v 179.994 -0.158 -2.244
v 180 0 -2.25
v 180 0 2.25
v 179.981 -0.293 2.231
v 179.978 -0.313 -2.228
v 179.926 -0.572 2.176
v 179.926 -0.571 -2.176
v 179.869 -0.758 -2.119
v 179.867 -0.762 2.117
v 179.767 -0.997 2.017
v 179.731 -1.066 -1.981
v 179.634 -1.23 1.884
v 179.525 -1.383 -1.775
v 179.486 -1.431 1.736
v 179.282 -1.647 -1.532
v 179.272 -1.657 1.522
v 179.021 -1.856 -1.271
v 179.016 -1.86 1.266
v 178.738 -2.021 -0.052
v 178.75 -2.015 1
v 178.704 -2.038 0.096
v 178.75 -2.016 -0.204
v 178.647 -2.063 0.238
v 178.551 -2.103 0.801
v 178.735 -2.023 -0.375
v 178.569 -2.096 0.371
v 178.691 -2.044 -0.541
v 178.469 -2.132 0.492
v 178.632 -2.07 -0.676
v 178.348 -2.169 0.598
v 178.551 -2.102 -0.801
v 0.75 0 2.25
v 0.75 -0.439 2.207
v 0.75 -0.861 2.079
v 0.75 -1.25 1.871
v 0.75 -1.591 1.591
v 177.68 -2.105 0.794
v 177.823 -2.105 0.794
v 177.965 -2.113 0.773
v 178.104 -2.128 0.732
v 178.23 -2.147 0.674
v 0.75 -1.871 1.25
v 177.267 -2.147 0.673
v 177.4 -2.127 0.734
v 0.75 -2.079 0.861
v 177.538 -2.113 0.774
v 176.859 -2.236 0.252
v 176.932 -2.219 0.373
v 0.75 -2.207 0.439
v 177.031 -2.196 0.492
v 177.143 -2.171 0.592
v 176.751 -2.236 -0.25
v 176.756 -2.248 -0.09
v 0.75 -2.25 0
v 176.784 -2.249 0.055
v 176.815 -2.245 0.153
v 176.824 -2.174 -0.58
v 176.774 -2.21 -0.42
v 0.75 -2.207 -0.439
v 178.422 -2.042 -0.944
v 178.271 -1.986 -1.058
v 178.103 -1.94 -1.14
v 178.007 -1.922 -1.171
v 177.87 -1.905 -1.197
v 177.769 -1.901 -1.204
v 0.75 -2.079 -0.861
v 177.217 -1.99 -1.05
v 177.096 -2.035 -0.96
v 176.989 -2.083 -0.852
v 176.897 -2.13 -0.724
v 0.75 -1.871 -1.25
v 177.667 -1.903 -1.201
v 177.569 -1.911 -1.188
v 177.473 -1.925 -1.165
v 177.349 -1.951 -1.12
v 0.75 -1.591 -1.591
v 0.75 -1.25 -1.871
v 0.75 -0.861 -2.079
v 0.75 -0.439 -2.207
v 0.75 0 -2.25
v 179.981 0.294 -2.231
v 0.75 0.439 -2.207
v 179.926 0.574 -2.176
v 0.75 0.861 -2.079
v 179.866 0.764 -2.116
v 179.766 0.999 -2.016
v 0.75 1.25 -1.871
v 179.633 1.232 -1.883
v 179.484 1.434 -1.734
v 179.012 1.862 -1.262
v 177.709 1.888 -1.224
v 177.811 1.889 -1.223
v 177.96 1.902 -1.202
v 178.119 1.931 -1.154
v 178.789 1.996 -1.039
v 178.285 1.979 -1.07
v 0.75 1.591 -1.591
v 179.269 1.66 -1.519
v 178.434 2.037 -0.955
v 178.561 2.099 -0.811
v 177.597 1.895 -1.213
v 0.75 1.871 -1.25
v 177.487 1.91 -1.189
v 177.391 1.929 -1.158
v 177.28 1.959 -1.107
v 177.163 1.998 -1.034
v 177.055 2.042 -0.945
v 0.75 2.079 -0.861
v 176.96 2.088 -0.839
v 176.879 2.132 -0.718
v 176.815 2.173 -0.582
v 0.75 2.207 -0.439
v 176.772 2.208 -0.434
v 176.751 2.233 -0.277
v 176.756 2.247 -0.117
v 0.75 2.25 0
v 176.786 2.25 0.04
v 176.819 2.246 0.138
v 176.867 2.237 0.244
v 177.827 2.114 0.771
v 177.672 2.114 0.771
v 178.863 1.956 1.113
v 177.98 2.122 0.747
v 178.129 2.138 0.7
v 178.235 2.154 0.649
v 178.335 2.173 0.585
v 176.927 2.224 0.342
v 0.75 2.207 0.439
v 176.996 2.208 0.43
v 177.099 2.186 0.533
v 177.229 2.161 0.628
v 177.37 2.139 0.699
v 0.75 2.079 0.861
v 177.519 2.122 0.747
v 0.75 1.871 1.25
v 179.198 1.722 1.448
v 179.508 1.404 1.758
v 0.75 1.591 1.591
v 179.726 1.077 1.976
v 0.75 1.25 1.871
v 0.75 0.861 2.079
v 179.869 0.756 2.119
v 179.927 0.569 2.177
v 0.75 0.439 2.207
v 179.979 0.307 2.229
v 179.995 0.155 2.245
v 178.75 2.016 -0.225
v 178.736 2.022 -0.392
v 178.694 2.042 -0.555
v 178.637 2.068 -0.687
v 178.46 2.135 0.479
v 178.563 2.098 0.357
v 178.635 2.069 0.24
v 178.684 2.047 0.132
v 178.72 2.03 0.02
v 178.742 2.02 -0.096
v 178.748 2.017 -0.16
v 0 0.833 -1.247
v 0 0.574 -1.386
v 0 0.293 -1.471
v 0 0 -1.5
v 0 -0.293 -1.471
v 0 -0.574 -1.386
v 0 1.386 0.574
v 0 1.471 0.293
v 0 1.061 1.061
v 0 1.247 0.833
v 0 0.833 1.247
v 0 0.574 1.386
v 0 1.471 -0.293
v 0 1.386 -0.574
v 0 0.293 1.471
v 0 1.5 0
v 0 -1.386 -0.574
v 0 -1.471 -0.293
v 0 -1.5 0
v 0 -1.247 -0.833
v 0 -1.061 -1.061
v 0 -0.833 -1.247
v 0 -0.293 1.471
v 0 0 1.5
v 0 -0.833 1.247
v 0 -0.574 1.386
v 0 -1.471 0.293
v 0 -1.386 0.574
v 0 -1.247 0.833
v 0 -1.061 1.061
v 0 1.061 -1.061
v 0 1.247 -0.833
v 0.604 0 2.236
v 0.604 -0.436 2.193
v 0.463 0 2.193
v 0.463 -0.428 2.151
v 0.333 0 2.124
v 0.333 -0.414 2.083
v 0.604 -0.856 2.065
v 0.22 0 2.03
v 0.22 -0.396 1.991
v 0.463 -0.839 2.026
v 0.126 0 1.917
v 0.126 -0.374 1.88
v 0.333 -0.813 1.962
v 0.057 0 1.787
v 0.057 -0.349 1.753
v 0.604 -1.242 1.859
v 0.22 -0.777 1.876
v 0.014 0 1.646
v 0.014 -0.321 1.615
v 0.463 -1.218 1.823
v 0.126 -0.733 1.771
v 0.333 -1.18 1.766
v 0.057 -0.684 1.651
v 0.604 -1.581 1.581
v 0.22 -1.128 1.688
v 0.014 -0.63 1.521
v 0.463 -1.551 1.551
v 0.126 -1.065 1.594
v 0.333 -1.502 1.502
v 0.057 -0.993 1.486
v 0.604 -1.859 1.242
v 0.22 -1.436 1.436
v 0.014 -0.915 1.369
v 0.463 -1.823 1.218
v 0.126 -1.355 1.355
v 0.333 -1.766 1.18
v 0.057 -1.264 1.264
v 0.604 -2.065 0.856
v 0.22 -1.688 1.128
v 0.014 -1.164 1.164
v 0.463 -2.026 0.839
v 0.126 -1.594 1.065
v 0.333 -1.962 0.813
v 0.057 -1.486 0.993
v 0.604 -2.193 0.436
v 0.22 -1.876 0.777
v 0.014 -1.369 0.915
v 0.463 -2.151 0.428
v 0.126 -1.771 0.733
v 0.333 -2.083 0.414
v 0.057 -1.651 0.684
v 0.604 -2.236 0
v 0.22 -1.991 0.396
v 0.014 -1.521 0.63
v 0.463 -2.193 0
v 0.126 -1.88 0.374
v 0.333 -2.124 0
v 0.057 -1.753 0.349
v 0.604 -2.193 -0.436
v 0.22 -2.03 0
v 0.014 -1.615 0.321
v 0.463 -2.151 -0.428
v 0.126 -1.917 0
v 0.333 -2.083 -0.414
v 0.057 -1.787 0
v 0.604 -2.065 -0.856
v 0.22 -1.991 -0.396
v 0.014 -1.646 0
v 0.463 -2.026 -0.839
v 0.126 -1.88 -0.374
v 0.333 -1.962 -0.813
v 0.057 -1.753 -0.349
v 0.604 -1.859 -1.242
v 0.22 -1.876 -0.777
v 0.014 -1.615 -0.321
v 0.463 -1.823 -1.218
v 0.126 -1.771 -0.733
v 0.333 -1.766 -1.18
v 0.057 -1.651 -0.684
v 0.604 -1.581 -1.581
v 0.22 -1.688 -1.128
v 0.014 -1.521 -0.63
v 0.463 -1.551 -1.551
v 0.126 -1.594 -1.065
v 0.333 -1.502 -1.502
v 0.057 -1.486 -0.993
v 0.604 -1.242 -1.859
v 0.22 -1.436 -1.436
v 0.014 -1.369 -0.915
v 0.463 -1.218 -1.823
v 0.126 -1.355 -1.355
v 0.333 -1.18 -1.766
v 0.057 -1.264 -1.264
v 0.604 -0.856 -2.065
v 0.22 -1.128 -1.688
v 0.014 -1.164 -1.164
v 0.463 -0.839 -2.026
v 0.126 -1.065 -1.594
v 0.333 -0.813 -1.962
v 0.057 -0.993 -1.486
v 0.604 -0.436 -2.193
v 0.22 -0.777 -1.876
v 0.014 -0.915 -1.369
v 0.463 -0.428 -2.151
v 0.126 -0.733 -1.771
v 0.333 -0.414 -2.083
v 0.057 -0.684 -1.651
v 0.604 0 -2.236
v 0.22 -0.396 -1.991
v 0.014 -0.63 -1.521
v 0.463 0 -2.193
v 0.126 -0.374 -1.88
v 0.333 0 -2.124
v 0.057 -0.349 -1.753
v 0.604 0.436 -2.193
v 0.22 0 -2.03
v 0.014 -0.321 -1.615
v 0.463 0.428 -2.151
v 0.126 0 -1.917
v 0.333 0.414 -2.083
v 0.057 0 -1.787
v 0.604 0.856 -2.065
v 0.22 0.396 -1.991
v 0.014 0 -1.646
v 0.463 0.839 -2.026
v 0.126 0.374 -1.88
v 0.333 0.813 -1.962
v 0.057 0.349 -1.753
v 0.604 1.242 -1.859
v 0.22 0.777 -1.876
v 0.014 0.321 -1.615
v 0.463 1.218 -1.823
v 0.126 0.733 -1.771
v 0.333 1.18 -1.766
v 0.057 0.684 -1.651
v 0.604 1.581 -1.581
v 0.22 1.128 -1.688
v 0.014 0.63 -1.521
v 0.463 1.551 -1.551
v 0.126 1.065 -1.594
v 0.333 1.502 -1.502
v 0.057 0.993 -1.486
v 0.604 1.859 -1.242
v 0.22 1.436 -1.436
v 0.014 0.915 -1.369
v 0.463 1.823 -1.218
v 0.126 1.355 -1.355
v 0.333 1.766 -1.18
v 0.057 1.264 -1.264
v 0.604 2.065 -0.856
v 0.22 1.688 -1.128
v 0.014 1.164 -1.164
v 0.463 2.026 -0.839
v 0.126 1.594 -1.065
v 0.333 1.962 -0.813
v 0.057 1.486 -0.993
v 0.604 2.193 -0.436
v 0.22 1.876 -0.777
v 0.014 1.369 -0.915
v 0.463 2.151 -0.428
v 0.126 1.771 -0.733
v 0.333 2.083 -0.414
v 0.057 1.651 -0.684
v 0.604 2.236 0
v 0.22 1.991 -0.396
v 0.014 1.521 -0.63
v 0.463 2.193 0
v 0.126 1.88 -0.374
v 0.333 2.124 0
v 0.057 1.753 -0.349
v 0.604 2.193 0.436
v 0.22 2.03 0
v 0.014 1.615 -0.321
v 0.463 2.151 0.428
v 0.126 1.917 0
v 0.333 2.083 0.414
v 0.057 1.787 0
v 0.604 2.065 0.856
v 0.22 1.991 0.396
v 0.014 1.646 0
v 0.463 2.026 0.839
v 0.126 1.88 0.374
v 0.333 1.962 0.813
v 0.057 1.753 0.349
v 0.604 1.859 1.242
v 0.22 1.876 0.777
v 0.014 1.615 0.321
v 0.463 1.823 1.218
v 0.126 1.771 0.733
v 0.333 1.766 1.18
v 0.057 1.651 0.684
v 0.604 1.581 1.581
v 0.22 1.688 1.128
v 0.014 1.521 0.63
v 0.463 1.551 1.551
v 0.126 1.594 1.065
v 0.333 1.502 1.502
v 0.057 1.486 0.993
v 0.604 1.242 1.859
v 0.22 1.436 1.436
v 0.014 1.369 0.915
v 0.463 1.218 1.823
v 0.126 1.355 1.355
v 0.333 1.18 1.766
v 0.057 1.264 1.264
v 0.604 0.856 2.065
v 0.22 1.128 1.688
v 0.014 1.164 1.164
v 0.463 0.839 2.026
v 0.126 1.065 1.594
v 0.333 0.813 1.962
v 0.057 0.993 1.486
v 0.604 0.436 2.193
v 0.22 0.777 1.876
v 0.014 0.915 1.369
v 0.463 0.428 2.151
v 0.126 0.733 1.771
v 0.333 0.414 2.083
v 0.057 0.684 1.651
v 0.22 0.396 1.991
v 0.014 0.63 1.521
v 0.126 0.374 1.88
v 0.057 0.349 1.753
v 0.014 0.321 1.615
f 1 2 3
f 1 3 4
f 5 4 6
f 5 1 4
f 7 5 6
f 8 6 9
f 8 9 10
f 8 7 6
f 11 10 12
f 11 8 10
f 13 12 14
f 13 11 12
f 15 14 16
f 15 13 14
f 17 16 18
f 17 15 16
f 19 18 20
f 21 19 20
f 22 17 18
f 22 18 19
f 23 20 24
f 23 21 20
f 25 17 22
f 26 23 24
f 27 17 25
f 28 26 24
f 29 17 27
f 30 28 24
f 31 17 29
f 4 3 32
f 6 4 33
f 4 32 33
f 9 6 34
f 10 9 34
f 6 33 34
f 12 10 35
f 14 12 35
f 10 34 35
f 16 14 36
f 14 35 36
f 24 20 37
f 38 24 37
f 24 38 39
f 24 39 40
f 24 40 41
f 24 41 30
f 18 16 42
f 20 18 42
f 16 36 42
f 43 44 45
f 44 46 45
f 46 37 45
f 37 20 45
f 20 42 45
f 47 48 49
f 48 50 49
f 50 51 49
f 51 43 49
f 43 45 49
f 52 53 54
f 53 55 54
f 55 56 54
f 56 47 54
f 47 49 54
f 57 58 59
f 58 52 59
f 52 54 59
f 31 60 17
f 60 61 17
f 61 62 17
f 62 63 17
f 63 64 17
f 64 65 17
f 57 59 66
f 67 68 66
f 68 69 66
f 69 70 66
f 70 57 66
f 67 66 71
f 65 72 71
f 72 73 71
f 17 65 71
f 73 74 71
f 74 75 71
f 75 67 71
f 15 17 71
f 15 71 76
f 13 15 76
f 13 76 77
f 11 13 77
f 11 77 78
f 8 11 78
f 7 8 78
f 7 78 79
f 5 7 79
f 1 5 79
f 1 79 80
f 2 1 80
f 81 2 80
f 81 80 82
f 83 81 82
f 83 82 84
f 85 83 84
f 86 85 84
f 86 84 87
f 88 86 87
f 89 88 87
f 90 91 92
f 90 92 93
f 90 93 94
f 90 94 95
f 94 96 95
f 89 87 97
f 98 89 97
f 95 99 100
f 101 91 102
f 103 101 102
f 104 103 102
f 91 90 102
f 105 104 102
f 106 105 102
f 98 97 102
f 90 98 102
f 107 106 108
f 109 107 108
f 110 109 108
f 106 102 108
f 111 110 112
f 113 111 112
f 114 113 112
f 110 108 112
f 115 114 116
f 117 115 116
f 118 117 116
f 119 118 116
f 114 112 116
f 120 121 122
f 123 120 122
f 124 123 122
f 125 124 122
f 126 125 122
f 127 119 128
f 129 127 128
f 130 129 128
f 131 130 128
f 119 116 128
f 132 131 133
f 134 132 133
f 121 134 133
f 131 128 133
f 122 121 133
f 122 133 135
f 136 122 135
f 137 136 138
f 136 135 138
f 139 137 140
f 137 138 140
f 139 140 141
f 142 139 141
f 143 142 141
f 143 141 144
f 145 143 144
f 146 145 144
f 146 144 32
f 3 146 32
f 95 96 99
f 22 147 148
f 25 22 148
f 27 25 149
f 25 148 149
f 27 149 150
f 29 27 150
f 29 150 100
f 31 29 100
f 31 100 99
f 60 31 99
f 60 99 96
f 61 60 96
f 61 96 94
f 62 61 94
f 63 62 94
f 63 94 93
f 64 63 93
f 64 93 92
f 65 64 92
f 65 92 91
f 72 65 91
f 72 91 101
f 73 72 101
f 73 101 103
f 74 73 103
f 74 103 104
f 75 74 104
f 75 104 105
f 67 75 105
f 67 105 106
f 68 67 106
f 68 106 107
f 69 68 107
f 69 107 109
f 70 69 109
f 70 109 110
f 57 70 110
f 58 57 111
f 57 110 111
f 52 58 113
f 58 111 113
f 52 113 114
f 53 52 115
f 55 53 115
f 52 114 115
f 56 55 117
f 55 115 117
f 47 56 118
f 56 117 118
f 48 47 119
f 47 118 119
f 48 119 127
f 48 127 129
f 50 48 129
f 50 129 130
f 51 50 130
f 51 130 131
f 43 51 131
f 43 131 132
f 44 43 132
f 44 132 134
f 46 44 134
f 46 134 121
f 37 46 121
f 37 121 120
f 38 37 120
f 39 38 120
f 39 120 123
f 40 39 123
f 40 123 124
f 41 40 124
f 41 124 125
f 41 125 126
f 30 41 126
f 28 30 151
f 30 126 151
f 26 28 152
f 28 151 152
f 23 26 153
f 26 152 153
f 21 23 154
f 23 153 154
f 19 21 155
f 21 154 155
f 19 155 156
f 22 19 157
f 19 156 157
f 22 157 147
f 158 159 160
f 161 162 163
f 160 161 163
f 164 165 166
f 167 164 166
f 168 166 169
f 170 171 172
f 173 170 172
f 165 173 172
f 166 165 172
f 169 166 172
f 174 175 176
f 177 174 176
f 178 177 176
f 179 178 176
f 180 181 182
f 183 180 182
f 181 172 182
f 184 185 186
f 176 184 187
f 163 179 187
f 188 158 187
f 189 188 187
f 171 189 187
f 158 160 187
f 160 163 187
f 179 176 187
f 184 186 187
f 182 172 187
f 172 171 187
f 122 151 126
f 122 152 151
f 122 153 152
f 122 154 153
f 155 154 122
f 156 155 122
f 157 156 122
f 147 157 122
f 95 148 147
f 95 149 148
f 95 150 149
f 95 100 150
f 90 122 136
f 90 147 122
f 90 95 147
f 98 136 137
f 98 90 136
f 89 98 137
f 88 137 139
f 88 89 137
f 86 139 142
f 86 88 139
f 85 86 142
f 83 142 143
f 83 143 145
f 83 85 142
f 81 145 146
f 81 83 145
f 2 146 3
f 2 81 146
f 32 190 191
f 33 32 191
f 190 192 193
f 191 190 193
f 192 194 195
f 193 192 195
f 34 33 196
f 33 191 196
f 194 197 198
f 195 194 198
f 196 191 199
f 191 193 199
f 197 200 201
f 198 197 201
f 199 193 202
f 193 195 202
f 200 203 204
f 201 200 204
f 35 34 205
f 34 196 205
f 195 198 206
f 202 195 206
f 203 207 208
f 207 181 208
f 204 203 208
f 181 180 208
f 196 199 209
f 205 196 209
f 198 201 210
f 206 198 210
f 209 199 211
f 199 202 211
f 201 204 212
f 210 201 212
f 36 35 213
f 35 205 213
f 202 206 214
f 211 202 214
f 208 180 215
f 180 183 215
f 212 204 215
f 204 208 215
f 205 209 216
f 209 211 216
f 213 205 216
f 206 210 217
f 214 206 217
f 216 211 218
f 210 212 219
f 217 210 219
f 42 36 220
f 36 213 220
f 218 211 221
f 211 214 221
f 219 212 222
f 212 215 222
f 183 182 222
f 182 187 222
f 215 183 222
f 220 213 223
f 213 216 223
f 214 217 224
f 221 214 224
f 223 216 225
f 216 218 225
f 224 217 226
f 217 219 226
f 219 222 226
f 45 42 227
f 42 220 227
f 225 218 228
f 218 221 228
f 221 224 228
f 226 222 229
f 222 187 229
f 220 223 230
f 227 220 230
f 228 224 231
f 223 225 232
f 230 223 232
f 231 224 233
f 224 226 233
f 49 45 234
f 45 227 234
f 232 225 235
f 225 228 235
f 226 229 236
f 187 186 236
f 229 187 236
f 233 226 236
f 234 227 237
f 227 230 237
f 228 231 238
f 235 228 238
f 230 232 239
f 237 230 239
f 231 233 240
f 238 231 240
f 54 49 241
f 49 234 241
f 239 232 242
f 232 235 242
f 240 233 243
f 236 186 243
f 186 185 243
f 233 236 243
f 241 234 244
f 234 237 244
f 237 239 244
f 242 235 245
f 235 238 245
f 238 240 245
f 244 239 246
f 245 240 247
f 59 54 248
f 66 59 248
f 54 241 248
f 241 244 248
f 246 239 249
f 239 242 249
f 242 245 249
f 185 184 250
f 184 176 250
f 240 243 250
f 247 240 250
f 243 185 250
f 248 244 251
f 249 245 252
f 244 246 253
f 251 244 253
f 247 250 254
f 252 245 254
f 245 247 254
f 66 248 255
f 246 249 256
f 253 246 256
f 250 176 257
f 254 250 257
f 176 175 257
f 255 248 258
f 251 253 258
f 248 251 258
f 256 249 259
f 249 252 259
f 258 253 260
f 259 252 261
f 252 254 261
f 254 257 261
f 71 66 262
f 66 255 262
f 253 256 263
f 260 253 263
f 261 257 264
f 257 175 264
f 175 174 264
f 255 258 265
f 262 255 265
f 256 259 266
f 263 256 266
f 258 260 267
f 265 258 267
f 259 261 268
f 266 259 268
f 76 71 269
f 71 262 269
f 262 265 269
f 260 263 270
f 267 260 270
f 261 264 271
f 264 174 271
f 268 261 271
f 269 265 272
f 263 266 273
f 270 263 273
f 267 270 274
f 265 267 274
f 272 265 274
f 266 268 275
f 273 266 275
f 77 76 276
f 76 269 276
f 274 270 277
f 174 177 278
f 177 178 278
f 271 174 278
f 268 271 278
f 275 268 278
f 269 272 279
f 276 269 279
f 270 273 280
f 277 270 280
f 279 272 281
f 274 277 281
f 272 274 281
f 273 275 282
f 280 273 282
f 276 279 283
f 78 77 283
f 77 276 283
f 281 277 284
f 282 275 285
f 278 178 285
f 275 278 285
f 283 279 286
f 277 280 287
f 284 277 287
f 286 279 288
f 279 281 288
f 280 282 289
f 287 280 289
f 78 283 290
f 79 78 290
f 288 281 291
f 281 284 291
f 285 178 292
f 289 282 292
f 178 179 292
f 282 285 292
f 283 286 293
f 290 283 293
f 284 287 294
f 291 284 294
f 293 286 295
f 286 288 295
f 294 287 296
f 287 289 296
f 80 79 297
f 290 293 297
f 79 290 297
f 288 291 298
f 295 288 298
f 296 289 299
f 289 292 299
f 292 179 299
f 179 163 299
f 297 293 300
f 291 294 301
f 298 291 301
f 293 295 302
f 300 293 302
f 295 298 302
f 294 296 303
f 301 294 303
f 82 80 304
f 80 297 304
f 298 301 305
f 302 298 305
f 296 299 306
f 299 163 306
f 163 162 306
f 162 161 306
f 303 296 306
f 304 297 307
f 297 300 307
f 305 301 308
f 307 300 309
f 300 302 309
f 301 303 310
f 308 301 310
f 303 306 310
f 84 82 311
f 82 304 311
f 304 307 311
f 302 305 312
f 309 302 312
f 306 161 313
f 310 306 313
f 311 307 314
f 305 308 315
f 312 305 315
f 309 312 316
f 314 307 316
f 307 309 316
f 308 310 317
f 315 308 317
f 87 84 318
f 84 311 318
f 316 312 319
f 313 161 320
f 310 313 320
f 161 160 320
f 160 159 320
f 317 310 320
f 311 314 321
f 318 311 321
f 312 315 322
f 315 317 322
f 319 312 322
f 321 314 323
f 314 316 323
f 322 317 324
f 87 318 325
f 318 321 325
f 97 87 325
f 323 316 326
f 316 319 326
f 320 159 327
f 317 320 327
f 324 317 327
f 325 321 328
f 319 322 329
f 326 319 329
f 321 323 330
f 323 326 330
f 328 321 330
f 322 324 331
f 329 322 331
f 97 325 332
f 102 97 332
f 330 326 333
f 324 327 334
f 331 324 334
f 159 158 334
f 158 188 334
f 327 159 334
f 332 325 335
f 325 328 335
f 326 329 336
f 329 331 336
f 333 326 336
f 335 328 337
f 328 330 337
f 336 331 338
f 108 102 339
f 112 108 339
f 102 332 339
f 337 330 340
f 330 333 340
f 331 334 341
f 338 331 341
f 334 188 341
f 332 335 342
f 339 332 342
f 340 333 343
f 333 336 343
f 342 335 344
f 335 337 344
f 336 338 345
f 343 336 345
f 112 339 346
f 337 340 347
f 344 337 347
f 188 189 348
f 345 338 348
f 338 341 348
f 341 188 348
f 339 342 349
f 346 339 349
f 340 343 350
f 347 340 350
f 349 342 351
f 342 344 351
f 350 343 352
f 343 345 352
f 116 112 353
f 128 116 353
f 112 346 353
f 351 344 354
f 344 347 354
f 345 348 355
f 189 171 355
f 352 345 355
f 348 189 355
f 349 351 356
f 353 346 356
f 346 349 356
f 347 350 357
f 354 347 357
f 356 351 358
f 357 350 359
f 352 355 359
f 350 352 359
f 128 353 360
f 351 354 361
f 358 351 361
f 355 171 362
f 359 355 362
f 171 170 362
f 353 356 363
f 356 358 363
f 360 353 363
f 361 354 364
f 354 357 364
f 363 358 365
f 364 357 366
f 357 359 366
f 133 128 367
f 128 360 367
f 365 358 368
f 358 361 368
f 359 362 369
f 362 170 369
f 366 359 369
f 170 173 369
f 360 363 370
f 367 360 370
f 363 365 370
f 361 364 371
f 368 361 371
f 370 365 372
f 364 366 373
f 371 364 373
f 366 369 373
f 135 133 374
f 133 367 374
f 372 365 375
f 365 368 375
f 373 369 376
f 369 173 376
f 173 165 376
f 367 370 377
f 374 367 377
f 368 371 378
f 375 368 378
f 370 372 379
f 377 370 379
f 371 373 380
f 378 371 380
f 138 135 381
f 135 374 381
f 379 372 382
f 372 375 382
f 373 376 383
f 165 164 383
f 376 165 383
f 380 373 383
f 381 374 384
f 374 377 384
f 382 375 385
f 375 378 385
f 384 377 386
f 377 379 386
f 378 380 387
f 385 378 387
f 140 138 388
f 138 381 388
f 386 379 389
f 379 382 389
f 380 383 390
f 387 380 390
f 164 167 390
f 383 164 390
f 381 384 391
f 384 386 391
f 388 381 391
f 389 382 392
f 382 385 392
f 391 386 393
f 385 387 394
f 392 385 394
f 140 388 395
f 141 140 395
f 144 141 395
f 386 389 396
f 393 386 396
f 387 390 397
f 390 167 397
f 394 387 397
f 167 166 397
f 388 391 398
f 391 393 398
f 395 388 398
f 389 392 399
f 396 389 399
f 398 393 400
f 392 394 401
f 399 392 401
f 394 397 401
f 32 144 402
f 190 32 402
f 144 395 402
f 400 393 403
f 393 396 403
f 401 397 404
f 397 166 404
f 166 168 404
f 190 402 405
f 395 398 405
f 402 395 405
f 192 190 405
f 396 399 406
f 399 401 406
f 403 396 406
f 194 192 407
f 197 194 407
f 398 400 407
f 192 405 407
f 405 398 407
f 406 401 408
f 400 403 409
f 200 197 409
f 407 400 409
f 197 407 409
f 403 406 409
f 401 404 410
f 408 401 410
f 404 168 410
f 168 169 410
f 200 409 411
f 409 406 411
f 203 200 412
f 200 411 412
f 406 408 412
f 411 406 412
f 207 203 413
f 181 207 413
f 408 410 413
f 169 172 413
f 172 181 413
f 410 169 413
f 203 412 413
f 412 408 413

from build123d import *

# Parameters (mm, degrees)
SKETCH1_R               = 2.25
BOSS_EXTRUDE1_DEPTH     = 180
FILLET1_R               = 0.75
CUT_EXTRUDE1_DEPTH      = 181.028122803
CUT_EXTRUDE1_DEPTH_BACK = 181.028122803
CAVITY1_OUTLINE_W       = 1
CAVITY1_OUTLINE_H       = 4.503251691


# Read off the part's stored shape, not the designer's step: Cavity1
with BuildPart() as part:
    # Sketch1 → Boss-Extrude1 (new body)
    with BuildSketch(Plane(origin=(0, 0, 0), x_dir=(0, 0, -1), z_dir=(1, 0, 0))):
        with Locations(Location((0, 0, 0), (0, 0, 180))):
            Circle(SKETCH1_R)
    extrude(amount=BOSS_EXTRUDE1_DEPTH)

    # Fillet1
    fillet1_edges = [part.edges().sort_by_distance(p)[0] for p in [
        (0, 0, -2.25),
    ]]
    fillet(fillet1_edges, radius=FILLET1_R)

    # Sketch2 → Cut-Extrude1 (cut, two sides: drawn at the far end of the back side and taken through both)
    with BuildSketch(Plane.XY.offset(-CUT_EXTRUDE1_DEPTH_BACK)):
        with BuildLine():
            Line((180, 2.25), (177.75, 2.25))
            ThreePointArc((177.75, 2.25), (179.340990258, 1.590990258), (180, 0))
            Line((180, 0), (180, 2.25))
        make_face()
        with BuildLine():
            Line((180, -2.25), (180, 0))
            ThreePointArc((180, 0), (179.340990258, -1.590990258), (177.75, -2.25))
            Line((177.75, -2.25), (180, -2.25))
        make_face()
    extrude(amount=CUT_EXTRUDE1_DEPTH + CUT_EXTRUDE1_DEPTH_BACK, mode=Mode.SUBTRACT)

    # Cavity1 outline → Cavity1 (revolve, cut)
    with BuildSketch(Plane(origin=(177.75, -0.001139824, -0.214423248), x_dir=(1, 0, 0), z_dir=(0, 0.005315692237830849, 0.9999858716082107))):
        with Locations((0.5, 0.001514697)):
            Rectangle(CAVITY1_OUTLINE_W, CAVITY1_OUTLINE_H)
    revolve(axis=Axis((177.75, -0.001139824, -0.214423248), (0, 0.9999858716082107, -0.005315692237830849)), mode=Mode.SUBTRACT)


solid = part.part
